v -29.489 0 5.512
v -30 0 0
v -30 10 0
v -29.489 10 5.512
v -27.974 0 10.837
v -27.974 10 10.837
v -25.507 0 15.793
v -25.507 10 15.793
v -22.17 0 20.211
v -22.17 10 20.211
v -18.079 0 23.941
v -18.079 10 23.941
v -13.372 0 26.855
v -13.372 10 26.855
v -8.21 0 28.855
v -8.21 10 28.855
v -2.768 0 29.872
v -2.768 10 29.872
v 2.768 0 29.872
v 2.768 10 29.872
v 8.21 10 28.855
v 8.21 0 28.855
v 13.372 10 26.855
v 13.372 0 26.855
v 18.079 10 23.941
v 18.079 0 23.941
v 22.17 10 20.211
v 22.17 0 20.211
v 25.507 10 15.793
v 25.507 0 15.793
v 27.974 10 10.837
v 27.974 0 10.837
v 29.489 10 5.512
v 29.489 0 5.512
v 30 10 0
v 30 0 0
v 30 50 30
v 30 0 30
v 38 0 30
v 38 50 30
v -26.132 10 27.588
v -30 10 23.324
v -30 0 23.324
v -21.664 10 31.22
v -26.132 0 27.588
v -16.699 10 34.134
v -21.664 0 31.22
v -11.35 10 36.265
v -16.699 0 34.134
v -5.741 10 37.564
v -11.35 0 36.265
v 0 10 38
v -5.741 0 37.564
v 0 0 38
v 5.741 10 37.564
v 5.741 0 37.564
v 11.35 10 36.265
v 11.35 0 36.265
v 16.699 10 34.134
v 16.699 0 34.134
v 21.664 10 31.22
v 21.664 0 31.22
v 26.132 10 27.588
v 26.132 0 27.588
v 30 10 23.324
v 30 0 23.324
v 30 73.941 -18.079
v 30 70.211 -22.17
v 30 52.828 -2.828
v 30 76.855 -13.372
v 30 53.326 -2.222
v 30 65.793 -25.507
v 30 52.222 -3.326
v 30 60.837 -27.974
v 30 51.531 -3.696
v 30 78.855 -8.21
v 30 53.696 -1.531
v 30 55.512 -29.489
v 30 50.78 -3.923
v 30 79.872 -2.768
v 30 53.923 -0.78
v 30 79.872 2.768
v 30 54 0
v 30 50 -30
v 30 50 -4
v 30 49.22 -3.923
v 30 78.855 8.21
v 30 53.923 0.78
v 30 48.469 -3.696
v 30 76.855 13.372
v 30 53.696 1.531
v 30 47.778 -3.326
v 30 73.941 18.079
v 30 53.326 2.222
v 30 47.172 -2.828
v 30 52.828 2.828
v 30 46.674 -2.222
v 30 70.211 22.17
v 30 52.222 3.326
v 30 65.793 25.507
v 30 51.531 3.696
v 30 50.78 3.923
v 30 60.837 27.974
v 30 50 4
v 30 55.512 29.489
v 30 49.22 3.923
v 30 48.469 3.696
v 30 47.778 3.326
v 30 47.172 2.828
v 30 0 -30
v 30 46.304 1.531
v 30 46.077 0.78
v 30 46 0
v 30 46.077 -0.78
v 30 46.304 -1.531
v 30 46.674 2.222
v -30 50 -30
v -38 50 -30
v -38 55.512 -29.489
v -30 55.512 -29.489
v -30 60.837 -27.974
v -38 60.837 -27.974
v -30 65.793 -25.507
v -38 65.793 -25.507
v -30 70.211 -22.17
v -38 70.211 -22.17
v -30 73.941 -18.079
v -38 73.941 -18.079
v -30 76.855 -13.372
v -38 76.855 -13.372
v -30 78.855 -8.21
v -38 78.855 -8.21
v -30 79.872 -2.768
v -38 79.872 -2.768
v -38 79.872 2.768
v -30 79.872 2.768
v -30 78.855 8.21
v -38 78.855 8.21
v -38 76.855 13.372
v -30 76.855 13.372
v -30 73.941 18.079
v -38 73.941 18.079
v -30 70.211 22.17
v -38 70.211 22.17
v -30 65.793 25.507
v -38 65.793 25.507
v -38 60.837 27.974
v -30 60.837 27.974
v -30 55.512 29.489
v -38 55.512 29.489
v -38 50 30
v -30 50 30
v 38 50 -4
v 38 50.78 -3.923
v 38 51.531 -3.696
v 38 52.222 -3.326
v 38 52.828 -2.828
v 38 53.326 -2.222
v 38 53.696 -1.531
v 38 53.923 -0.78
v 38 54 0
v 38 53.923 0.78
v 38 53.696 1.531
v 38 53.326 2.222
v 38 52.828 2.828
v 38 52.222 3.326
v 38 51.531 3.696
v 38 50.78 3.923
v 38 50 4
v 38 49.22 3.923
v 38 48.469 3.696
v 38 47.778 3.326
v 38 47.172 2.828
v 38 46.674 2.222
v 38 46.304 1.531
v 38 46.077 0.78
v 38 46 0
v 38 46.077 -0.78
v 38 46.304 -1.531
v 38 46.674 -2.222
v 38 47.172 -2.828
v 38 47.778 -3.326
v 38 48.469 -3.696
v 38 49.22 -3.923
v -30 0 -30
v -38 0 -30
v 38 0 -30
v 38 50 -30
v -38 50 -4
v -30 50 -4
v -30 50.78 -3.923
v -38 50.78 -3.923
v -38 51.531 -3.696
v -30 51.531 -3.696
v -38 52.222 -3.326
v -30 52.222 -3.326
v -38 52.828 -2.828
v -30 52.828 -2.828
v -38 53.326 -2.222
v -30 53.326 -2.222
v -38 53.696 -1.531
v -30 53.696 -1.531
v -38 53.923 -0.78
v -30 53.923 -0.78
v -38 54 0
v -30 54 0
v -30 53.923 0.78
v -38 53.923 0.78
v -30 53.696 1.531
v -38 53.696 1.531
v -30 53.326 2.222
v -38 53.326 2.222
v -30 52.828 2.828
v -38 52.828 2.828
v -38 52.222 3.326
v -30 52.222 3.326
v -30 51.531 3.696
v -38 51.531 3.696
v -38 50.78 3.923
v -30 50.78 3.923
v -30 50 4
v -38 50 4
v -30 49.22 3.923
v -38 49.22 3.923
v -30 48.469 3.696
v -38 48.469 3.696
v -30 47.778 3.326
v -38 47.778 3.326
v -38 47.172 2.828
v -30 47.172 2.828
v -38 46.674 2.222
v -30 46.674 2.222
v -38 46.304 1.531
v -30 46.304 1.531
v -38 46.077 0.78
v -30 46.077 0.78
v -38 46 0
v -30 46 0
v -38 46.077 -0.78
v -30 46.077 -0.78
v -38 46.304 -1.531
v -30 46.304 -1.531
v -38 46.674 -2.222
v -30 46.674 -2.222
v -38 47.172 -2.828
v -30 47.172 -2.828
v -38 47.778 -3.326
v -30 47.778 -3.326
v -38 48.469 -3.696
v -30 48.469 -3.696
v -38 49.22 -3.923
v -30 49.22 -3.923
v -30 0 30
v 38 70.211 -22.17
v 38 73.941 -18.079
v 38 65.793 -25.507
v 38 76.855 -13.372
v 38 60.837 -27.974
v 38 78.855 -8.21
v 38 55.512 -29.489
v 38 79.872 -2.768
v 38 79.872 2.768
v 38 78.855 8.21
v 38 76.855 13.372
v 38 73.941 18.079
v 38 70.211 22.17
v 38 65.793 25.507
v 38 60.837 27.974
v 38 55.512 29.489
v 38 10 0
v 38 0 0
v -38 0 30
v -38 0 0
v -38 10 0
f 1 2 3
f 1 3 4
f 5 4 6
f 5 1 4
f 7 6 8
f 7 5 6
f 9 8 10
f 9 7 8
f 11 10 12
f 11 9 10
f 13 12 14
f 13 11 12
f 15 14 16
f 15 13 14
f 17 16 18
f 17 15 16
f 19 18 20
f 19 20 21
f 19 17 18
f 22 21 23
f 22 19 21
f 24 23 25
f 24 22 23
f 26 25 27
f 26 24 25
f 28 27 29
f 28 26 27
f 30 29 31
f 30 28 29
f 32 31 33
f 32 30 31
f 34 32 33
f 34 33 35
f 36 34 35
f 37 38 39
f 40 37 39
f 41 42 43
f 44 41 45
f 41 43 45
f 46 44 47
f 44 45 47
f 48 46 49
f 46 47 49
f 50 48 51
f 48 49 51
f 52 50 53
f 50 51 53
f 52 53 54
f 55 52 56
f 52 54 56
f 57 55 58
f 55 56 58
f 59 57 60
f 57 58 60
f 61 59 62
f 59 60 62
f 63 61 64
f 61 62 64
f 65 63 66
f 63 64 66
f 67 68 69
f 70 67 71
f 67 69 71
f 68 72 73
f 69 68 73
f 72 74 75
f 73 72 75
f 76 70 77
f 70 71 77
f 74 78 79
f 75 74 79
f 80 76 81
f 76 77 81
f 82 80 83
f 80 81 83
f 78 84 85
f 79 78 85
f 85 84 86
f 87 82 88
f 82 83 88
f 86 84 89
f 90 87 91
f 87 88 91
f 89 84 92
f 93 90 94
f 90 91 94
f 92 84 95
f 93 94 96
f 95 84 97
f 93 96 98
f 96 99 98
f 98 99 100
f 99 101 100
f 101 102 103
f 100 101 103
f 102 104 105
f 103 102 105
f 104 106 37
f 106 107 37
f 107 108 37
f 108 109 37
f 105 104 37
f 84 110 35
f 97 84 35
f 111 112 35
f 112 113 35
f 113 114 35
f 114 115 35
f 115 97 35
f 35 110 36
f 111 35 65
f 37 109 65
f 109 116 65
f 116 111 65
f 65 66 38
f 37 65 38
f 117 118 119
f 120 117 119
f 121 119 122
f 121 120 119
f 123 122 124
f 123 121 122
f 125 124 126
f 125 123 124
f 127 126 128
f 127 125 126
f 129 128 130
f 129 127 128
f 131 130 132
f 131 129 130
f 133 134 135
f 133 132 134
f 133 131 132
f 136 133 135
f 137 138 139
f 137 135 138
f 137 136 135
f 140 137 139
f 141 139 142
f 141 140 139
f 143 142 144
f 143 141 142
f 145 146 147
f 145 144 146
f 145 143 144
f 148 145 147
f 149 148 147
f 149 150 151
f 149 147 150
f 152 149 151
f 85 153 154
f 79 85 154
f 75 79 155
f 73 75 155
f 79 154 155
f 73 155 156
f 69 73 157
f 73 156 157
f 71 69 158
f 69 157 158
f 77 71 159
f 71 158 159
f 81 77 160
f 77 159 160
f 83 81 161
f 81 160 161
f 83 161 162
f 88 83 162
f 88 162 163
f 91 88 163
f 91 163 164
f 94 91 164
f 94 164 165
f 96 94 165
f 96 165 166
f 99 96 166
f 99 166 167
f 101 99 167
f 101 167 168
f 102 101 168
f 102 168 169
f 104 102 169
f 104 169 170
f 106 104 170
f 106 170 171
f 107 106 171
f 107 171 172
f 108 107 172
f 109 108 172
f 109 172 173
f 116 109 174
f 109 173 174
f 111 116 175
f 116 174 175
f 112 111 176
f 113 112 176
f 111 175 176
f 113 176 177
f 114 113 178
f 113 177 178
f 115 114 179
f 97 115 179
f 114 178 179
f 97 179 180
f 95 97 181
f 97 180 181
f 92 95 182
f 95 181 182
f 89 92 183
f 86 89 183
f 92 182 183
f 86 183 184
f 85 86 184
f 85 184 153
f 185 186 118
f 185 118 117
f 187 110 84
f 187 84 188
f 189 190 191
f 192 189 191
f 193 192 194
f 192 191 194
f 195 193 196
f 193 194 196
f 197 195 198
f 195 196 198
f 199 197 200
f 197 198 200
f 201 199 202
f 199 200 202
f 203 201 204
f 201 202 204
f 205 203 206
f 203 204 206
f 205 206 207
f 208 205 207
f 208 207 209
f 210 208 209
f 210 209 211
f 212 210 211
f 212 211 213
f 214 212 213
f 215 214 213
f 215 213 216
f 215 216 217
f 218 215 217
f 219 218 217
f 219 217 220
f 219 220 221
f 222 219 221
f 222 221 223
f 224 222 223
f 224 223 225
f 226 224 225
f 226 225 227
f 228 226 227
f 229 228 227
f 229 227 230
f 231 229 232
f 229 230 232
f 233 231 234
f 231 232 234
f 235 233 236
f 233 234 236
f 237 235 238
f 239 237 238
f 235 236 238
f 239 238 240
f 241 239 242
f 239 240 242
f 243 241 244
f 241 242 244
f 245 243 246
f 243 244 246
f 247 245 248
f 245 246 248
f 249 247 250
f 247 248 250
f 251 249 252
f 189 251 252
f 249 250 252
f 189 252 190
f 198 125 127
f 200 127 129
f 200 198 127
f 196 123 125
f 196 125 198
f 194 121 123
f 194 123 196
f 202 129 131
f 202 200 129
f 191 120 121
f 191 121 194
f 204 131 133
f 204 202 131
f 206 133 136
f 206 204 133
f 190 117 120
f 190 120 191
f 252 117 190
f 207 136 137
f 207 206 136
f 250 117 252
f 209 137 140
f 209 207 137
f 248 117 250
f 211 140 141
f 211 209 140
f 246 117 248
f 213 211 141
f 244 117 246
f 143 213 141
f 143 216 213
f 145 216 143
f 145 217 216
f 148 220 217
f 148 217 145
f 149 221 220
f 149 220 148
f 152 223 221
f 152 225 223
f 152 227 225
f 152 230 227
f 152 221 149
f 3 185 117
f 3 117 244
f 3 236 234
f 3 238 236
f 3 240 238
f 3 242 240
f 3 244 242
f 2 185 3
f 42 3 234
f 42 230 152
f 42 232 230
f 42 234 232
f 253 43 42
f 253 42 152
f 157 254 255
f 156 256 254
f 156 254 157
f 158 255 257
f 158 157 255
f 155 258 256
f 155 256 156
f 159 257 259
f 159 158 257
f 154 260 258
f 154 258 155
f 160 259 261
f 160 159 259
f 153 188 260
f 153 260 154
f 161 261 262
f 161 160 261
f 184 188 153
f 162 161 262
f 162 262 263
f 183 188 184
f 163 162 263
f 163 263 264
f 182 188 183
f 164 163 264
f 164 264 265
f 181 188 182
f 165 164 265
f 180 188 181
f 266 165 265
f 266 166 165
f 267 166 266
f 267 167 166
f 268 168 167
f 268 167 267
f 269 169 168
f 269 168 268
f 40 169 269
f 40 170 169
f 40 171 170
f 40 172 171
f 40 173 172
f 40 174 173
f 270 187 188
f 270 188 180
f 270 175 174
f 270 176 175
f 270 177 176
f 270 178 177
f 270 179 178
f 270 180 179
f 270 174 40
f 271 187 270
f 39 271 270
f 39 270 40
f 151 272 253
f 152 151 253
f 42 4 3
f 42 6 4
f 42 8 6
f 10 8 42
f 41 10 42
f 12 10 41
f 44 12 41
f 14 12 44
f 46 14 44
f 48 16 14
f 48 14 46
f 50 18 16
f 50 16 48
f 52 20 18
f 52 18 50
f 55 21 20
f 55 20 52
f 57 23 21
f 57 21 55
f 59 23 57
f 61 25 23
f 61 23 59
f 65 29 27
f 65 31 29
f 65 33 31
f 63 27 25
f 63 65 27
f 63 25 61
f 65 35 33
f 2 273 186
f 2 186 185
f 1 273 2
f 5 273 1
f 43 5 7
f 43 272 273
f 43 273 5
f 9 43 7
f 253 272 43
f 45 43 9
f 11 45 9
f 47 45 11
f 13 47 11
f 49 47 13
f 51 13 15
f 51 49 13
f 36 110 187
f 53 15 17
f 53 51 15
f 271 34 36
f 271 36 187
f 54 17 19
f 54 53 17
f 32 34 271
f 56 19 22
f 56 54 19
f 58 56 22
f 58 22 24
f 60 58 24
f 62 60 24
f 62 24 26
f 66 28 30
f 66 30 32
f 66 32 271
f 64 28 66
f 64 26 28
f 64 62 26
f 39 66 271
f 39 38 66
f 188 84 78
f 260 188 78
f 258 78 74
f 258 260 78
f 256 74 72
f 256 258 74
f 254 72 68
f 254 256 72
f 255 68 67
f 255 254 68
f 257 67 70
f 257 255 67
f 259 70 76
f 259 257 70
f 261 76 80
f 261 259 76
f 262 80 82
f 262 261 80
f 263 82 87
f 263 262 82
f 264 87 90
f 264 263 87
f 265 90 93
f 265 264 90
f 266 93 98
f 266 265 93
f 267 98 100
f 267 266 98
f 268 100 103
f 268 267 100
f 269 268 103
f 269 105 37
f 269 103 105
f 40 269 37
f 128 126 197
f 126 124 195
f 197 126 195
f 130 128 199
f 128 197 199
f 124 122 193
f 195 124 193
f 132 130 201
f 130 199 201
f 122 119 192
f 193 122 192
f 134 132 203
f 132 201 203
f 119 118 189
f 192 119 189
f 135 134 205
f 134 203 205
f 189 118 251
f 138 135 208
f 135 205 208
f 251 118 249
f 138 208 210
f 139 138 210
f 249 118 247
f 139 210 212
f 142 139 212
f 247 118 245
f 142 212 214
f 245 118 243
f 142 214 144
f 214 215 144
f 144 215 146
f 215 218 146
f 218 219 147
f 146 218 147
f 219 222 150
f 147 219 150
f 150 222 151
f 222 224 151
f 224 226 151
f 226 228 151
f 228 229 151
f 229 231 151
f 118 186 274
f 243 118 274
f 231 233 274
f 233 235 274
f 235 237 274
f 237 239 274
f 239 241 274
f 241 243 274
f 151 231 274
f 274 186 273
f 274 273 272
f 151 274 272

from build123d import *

# Parameters (mm, degrees)
SKETCH_1_R          = 38
SKETCH_1_R_2        = 30
EXTRUDE_1_DEPTH     = 10
SKETCH_2_W          = 8
SKETCH_2_H          = 60
EXTRUDE_2_DEPTH     = 80
SKETCH_3_R          = 4
CUT_EXTRUDE_1_DEPTH = 80
SKETCH_4_W          = 60
SKETCH_4_H          = 40.678120155
CUT_EXTRUDE_2_DEPTH = 97.374270425


with BuildPart() as part:
    # 草图1 → 凸台-拉伸1 (new body)
    with BuildSketch(Plane(origin=(0, 0, 0), x_dir=(1, 0, 0), z_dir=(0, 1, 0))):
        with Locations(Location((0, 0, 0), (0, 0, 270))):
            Circle(SKETCH_1_R)
        with Locations(Location((0, 0, 0), (0, 0, 270))):
            Circle(SKETCH_1_R_2, mode=Mode.SUBTRACT)
    extrude(amount=EXTRUDE_1_DEPTH)

    # 草图2 → 凸台-拉伸2 (add)
    with BuildSketch(Plane.XZ):
        with Locations((-34, 0)):
            Rectangle(SKETCH_2_W, SKETCH_2_H)
        with Locations((34, 0)):
            Rectangle(SKETCH_2_W, SKETCH_2_H)
    extrude(amount=-EXTRUDE_2_DEPTH)

    # 草图3 → 切除-拉伸1 (cut)
    with BuildSketch(Plane(origin=(38, 0, 0), x_dir=(0, 0, -1), z_dir=(1, 0, 0))):
        with Locations((0, 50)):
            Circle(SKETCH_3_R)
        with BuildLine():
            Line((-30, 50), (-30, 88))
            Line((-30, 88), (30, 88))
            Line((30, 88), (30, 50))
            ThreePointArc((30, 50), (0, 80), (-30, 50))
        make_face()
    extrude(amount=-CUT_EXTRUDE_1_DEPTH, mode=Mode.SUBTRACT)

    # 草图4 → 切除-拉伸2 (cut, through all)
    with BuildSketch(Plane.XZ):
        with Locations((0, -20.339060078)):
            Rectangle(SKETCH_4_W, SKETCH_4_H)
    extrude(amount=-CUT_EXTRUDE_2_DEPTH, mode=Mode.SUBTRACT)


solid = part.part
